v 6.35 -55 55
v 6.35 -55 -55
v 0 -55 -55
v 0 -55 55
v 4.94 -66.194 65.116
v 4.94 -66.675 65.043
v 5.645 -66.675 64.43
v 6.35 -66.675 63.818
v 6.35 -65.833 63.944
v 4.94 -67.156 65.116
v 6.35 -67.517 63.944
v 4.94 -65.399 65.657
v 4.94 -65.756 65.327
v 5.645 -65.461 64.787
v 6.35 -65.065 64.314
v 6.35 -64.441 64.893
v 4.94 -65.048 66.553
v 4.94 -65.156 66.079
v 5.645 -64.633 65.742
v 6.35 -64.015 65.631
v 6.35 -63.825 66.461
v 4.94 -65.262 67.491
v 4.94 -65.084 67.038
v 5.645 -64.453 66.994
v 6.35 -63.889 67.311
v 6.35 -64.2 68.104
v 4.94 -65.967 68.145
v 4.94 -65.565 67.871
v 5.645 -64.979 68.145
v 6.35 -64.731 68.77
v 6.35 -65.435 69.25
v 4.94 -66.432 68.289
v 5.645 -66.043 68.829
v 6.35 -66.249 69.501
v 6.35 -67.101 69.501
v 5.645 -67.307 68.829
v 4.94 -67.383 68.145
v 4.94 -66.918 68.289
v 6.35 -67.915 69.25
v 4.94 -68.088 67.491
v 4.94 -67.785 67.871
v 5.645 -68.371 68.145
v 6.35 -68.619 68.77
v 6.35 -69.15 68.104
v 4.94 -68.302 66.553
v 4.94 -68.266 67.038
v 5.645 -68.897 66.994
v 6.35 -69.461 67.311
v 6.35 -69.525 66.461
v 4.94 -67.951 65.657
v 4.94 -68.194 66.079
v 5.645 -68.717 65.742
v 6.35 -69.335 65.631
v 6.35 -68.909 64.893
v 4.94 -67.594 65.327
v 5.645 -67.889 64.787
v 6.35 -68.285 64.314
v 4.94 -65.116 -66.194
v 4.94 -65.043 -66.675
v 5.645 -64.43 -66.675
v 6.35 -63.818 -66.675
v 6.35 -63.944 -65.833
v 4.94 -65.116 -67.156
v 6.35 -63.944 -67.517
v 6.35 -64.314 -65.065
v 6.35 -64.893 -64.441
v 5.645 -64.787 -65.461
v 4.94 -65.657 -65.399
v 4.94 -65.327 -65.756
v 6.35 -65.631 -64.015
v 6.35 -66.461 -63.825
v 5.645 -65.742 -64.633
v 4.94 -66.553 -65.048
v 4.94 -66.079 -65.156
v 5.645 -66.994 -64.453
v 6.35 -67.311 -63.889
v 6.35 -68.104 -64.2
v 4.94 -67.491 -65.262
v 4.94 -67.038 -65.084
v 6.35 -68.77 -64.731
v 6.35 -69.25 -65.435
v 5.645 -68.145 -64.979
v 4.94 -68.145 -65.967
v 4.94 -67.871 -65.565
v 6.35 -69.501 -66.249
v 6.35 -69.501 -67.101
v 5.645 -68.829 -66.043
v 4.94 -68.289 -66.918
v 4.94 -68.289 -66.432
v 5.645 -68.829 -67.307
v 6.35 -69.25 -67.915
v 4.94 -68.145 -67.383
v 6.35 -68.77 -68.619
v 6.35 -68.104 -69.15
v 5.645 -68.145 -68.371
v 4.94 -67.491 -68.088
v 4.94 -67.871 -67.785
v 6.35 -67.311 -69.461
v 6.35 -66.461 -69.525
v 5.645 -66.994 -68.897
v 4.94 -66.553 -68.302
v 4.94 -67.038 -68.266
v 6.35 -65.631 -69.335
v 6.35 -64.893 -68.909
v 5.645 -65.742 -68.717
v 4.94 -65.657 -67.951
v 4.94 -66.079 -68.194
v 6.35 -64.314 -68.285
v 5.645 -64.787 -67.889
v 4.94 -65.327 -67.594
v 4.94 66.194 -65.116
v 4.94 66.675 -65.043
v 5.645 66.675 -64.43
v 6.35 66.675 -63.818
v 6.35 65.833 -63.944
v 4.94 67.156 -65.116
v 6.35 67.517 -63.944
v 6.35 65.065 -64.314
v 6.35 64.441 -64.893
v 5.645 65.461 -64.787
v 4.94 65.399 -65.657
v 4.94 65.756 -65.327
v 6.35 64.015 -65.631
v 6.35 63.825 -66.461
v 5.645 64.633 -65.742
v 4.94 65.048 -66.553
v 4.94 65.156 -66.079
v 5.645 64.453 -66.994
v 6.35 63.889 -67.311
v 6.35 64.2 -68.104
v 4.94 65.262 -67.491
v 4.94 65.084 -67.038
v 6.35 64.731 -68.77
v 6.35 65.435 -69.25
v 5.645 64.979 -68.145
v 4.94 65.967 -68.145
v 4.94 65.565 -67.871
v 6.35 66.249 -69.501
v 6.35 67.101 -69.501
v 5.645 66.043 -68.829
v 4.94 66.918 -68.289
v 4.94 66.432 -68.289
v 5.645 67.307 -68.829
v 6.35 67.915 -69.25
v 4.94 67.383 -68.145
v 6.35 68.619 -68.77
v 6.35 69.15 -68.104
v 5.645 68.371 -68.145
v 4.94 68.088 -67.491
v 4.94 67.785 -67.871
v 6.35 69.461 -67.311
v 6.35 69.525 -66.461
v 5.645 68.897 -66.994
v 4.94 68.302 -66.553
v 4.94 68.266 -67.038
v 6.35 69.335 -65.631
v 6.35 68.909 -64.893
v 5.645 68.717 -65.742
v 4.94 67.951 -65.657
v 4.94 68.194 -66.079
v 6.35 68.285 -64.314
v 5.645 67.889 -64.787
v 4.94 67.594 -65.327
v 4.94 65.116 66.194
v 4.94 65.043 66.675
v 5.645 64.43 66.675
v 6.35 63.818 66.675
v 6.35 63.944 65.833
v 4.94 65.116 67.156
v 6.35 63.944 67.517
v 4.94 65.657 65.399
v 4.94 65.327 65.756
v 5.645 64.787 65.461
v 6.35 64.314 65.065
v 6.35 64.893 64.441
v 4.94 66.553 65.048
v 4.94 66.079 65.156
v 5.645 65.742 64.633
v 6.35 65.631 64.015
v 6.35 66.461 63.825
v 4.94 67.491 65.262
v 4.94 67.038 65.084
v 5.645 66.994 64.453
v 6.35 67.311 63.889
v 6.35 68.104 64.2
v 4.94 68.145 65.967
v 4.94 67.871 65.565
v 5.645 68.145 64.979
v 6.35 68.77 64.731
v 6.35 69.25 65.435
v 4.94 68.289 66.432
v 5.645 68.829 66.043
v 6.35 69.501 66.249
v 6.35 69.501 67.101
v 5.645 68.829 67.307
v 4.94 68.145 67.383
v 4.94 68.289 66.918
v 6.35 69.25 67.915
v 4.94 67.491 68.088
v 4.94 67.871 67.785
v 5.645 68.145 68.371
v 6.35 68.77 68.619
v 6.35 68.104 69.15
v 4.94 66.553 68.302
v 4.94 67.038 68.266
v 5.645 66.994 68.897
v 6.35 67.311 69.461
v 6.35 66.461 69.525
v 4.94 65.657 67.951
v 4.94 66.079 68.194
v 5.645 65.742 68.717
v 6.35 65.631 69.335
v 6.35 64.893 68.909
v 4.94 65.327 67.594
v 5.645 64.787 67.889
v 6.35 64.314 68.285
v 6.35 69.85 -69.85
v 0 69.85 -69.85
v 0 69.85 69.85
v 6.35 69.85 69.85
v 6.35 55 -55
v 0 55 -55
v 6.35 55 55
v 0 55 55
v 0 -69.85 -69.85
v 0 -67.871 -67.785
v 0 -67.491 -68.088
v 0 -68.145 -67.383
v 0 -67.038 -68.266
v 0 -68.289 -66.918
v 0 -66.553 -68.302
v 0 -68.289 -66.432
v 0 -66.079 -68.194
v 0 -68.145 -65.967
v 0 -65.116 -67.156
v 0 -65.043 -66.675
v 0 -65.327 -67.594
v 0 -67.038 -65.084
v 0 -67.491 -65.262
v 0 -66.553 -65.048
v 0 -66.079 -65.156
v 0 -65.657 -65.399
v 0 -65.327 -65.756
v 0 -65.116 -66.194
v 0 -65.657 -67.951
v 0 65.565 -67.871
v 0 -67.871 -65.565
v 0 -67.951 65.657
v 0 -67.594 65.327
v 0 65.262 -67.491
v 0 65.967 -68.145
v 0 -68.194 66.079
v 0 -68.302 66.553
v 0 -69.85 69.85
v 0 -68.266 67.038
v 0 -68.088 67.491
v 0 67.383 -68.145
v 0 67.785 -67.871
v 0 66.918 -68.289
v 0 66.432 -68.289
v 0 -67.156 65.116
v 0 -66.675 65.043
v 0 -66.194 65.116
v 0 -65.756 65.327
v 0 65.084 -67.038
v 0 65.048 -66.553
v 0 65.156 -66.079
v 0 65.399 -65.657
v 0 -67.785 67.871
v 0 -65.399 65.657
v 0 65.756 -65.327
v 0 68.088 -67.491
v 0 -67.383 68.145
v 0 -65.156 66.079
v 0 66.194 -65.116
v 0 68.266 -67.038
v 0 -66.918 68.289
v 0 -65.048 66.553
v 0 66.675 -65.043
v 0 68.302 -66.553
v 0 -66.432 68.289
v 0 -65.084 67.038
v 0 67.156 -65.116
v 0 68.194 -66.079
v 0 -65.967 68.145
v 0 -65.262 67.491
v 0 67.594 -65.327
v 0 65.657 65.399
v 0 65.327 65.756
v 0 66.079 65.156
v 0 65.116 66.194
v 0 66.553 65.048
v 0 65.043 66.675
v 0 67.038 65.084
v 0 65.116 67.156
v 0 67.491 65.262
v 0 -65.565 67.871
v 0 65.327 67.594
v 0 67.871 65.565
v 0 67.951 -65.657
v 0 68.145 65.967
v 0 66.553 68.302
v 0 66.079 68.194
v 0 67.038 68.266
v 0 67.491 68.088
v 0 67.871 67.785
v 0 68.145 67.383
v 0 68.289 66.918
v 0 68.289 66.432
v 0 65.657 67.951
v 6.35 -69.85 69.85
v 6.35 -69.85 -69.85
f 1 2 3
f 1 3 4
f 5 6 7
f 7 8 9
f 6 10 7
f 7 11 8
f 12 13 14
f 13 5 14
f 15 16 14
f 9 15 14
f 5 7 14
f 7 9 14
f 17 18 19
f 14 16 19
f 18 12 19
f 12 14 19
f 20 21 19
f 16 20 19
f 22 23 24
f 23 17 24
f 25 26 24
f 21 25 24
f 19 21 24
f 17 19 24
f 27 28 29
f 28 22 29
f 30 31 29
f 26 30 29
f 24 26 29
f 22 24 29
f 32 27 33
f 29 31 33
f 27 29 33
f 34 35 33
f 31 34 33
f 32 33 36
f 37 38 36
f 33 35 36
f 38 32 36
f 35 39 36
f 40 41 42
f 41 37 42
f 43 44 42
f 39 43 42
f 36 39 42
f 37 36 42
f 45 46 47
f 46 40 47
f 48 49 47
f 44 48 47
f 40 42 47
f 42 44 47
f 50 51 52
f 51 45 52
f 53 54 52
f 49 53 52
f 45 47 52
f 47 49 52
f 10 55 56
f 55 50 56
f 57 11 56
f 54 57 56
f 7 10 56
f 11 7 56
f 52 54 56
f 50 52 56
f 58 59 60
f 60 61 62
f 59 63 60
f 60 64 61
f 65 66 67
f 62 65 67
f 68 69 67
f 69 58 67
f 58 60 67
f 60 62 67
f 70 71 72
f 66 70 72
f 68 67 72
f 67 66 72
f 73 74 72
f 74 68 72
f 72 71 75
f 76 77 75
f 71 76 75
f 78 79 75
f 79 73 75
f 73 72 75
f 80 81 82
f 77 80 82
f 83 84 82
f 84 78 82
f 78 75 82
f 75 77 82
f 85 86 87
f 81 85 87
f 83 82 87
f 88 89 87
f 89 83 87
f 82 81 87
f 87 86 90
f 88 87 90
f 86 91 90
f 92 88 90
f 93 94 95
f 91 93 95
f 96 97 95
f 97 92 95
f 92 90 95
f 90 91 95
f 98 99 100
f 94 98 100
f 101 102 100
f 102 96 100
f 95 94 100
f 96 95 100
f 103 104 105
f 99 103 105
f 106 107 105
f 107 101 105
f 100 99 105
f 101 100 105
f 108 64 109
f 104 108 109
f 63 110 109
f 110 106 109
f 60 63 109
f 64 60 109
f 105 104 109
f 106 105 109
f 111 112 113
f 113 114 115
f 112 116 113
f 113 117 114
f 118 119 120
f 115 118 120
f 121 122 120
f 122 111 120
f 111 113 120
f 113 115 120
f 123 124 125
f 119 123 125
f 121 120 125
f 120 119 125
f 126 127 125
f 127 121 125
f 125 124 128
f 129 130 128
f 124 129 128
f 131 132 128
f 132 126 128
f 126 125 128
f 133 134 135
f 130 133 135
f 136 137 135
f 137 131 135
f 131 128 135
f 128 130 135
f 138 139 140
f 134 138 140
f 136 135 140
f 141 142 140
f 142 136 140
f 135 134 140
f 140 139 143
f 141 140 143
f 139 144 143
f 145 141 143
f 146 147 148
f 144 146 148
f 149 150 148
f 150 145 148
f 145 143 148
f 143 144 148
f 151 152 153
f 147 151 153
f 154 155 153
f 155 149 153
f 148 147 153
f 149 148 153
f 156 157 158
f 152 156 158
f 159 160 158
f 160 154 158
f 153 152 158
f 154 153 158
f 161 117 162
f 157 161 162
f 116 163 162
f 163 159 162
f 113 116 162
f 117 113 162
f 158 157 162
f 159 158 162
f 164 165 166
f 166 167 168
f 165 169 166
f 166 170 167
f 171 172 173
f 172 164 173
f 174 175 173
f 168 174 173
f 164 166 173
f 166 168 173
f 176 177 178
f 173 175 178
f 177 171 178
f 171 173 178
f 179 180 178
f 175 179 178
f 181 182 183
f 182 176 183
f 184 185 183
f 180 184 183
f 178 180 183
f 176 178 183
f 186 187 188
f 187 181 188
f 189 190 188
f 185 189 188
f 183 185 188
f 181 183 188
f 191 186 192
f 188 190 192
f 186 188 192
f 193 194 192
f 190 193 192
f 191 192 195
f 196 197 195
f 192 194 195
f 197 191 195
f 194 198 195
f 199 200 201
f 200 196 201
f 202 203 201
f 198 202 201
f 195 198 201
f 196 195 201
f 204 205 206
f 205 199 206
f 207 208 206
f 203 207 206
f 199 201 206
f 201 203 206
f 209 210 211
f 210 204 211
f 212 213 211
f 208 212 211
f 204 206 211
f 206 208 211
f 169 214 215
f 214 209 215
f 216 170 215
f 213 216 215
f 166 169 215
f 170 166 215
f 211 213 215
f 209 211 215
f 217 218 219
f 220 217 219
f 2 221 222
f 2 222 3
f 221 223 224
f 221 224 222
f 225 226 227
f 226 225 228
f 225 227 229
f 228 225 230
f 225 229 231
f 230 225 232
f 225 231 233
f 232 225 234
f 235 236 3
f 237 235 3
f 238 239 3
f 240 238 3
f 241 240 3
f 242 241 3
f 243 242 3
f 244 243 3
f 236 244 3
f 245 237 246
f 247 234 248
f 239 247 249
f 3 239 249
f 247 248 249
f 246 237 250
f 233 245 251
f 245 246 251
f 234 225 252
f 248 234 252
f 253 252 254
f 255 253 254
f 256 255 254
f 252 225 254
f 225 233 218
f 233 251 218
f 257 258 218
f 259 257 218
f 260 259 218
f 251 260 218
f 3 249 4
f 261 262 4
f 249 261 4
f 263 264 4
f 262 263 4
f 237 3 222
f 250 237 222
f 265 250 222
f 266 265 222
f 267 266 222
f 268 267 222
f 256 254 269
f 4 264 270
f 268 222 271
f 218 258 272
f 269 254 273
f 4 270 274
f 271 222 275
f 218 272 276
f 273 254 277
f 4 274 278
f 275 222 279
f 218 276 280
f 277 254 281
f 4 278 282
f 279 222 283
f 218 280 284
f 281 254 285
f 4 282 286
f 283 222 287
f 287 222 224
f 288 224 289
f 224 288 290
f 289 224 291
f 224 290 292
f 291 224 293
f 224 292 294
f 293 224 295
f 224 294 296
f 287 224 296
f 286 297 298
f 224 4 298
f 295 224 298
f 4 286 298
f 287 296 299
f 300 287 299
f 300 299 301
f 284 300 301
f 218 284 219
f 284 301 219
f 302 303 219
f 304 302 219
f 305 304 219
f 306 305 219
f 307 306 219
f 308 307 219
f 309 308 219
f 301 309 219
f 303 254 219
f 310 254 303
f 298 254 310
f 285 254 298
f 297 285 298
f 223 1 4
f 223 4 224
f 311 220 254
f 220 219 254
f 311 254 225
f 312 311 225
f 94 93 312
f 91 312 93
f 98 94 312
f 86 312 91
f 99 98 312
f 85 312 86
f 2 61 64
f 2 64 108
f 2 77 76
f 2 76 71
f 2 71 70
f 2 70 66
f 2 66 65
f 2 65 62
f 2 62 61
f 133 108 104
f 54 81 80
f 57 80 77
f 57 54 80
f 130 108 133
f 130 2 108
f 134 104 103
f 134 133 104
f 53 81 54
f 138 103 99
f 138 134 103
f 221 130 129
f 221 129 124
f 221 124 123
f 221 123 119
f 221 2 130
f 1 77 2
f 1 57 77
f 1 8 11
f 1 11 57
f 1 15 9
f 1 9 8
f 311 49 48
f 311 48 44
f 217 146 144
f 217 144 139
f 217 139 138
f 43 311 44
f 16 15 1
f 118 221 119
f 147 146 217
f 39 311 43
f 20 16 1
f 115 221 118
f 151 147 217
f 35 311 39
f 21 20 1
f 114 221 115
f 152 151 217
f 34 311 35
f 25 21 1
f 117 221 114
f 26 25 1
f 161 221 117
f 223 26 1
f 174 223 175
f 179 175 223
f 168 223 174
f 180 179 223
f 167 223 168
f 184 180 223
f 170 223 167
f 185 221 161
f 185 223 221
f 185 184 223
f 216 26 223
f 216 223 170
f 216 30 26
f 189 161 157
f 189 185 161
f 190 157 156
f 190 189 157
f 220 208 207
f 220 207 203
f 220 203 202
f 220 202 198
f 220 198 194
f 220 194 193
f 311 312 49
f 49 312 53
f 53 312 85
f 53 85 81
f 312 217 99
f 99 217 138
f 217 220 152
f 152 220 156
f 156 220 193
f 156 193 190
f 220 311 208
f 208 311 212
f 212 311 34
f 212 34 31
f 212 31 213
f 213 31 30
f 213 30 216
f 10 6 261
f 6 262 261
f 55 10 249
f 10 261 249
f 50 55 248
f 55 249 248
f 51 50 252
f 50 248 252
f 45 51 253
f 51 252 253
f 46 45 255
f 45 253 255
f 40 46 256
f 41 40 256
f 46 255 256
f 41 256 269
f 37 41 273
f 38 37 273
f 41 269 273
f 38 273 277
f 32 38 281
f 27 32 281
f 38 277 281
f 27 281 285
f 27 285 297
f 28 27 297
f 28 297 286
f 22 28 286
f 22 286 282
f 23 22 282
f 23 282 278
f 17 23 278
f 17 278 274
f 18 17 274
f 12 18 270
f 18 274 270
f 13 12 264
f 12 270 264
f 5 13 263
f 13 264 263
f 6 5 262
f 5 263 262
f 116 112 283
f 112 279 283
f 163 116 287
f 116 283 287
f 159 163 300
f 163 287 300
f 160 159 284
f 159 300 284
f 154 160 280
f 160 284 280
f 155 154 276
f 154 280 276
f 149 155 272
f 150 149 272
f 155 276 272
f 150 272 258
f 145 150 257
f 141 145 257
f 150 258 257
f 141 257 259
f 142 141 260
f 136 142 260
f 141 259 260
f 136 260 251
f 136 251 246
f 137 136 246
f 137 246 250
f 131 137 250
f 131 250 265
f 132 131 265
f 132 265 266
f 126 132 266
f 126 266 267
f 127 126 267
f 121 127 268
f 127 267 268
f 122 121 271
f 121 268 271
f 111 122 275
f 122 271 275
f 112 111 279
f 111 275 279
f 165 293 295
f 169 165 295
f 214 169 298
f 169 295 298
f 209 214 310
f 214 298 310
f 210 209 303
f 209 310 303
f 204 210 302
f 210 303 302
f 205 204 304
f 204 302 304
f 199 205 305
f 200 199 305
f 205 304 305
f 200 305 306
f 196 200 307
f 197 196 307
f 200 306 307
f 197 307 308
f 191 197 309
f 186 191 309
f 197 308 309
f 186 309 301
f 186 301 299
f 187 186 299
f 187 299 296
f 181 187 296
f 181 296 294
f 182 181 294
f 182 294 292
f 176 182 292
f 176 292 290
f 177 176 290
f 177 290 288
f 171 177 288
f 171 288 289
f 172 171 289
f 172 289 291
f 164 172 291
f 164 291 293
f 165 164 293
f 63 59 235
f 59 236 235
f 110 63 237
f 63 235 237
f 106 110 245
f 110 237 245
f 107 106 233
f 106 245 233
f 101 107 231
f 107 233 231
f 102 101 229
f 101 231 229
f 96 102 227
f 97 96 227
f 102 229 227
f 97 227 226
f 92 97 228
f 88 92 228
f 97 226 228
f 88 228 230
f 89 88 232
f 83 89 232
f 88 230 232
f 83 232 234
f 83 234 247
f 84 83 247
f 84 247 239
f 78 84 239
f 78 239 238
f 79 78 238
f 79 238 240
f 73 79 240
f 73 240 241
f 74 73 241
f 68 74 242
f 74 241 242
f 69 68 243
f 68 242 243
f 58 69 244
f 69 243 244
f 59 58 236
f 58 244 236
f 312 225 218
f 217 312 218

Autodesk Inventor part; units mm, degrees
ref_plane "YZ Plane" through (0, 0, 0) normal (1, 0, 0) x (0, 1, 0)
ref_plane "XZ Plane" through (0, 0, 0) normal (0, 1, 0) x (-1, 0, 0)
ref_plane "XY Plane" through (0, 0, 0) normal (0, 0, 1) x (1, 0, 0)
sketch "Sketch1" plane through (0, 0, 0) normal (1, 0, 0) x (0, 1, 0)
  line L0 (-69.85, -69.85) -> (69.85, -69.85)
  line L1 (69.85, -69.85) -> (69.85, 69.85)
  line L2 (69.85, 69.85) -> (-69.85, 69.85)
  line L3 (-69.85, 69.85) -> (-69.85, -69.85)
  line L4 (-69.85, -69.85) -> (69.85, 69.85) construction
  line L5 (69.85, -69.85) -> (-69.85, 69.85) construction
  point P0 (0, 0)
  dimension "d0" = 139.7
  dimension "d1" = 139.7
extrude "Extrusion1" add sketch "Sketch1" along normal blind 6.35
sketch "Sketch26" plane through (6.35, 0, 0) normal (1, 0, 0) x (0, 0, -1)
  line L0 (69.85, -69.85) -> (69.85, 69.85) projected
  line L1 (69.85, 69.85) -> (-69.85, 69.85) projected
  line L2 (-69.85, 69.85) -> (-69.85, -69.85) projected
  line L3 (-69.85, -69.85) -> (69.85, -69.85) projected
  point P0 (0, 0)
  point P1 (-66.675, -66.675)
  dimension "d247" = 3.175
  dimension "d248" = 3.175
hole "Hole14" at (6.35, -66.675, 66.675) direction (-1, 0, 0) diameter 3.264 end through all countersink diameter 5.715 countersink angle 82 clearance for "Flat Head Machine Screw (82)" size "#4" standard "Ansi Unified Screw Threads"
pattern_circular "Circular Pattern1" count 4 over 360 about axis through (-10, 0, 0) along (1, 0, 0) of "Hole14"
sketch "Sketch27" plane through (6.35, 0, 0) normal (1, 0, 0) x (0, 0, -1)
  circle A0 centre (-66.675, 66.675) radius 2.8575 projected
  circle A1 centre (66.675, 66.675) radius 2.8575 projected
  circle A2 centre (66.675, -66.675) radius 2.8575 projected
  circle A3 centre (-66.675, -66.675) radius 2.8575 projected
  line L0 (69.85, -69.85) -> (69.85, 69.85) projected
  line L1 (69.85, 69.85) -> (-69.85, 69.85) projected
  line L2 (-69.85, 69.85) -> (-69.85, -69.85) projected
  line L3 (-69.85, -69.85) -> (69.85, -69.85) projected
  line L4 (55, -55) -> (-55, -55)
  line L5 (-55, -55) -> (-55, 55)
  line L6 (-55, 55) -> (55, 55)
  line L7 (55, 55) -> (55, -55)
  line L8 (55, -55) -> (-55, 55) construction
  line L9 (-55, -55) -> (55, 55) construction
  point P0 (0, 0)
  dimension "d259" = 110
  dimension "d260" = 110
extrude "Extrusion12" cut sketch "Sketch27" against normal through all contours L4 L5 L6 L7
equation "\"height\" = 127"
equation "\"frameAcrylicThickness\" = 9.525"
equation "\"internalAcrylicThickness\" = 6.35"
equation "\"width\" = 127"
equation "\"depth\" = 146.05"
equation "\"mirrorAngle\" = 5deg"
equation "\"detectorWidth\" = 52"
equation "\"detectorHeight\" = 52"
equation "\"mirrorThickness\" = 3.175"
equation "\"fresnelThickness\" = 0.1"
equation "\"focalLength\" = 76.2"
equation "\"ior\" = 1.49"
equation "\"centerThickness\" = 1.524"
equation "\"fresnelAngle\" = 90deg"
equation "\"fresnelEffectiveDiameter\" = 152.4"
equation "\"oRingWidth\" = 1.5875"
equation "\"sensorHolderDepth\" = 19.05"
equation "\"aerogelClearence\" = 3.175"
equation "\"backplanePCBHeight\" = 76.2"
equation "\"backplanePCBWidth\" = 76.2"
equation "\"backplaneHoleOffsett\" = 6.35"
equation "\"backplanePostionOffsett\" = 12.7"
equation "\"moduleSlotClearence\" = 0.79375"
equation "\"plasticThickness\" = 6.35"
equation "\"aerogelHolderDepth\" = 37.30625"
properties part number "back" material "PC/ABS Plastic"
